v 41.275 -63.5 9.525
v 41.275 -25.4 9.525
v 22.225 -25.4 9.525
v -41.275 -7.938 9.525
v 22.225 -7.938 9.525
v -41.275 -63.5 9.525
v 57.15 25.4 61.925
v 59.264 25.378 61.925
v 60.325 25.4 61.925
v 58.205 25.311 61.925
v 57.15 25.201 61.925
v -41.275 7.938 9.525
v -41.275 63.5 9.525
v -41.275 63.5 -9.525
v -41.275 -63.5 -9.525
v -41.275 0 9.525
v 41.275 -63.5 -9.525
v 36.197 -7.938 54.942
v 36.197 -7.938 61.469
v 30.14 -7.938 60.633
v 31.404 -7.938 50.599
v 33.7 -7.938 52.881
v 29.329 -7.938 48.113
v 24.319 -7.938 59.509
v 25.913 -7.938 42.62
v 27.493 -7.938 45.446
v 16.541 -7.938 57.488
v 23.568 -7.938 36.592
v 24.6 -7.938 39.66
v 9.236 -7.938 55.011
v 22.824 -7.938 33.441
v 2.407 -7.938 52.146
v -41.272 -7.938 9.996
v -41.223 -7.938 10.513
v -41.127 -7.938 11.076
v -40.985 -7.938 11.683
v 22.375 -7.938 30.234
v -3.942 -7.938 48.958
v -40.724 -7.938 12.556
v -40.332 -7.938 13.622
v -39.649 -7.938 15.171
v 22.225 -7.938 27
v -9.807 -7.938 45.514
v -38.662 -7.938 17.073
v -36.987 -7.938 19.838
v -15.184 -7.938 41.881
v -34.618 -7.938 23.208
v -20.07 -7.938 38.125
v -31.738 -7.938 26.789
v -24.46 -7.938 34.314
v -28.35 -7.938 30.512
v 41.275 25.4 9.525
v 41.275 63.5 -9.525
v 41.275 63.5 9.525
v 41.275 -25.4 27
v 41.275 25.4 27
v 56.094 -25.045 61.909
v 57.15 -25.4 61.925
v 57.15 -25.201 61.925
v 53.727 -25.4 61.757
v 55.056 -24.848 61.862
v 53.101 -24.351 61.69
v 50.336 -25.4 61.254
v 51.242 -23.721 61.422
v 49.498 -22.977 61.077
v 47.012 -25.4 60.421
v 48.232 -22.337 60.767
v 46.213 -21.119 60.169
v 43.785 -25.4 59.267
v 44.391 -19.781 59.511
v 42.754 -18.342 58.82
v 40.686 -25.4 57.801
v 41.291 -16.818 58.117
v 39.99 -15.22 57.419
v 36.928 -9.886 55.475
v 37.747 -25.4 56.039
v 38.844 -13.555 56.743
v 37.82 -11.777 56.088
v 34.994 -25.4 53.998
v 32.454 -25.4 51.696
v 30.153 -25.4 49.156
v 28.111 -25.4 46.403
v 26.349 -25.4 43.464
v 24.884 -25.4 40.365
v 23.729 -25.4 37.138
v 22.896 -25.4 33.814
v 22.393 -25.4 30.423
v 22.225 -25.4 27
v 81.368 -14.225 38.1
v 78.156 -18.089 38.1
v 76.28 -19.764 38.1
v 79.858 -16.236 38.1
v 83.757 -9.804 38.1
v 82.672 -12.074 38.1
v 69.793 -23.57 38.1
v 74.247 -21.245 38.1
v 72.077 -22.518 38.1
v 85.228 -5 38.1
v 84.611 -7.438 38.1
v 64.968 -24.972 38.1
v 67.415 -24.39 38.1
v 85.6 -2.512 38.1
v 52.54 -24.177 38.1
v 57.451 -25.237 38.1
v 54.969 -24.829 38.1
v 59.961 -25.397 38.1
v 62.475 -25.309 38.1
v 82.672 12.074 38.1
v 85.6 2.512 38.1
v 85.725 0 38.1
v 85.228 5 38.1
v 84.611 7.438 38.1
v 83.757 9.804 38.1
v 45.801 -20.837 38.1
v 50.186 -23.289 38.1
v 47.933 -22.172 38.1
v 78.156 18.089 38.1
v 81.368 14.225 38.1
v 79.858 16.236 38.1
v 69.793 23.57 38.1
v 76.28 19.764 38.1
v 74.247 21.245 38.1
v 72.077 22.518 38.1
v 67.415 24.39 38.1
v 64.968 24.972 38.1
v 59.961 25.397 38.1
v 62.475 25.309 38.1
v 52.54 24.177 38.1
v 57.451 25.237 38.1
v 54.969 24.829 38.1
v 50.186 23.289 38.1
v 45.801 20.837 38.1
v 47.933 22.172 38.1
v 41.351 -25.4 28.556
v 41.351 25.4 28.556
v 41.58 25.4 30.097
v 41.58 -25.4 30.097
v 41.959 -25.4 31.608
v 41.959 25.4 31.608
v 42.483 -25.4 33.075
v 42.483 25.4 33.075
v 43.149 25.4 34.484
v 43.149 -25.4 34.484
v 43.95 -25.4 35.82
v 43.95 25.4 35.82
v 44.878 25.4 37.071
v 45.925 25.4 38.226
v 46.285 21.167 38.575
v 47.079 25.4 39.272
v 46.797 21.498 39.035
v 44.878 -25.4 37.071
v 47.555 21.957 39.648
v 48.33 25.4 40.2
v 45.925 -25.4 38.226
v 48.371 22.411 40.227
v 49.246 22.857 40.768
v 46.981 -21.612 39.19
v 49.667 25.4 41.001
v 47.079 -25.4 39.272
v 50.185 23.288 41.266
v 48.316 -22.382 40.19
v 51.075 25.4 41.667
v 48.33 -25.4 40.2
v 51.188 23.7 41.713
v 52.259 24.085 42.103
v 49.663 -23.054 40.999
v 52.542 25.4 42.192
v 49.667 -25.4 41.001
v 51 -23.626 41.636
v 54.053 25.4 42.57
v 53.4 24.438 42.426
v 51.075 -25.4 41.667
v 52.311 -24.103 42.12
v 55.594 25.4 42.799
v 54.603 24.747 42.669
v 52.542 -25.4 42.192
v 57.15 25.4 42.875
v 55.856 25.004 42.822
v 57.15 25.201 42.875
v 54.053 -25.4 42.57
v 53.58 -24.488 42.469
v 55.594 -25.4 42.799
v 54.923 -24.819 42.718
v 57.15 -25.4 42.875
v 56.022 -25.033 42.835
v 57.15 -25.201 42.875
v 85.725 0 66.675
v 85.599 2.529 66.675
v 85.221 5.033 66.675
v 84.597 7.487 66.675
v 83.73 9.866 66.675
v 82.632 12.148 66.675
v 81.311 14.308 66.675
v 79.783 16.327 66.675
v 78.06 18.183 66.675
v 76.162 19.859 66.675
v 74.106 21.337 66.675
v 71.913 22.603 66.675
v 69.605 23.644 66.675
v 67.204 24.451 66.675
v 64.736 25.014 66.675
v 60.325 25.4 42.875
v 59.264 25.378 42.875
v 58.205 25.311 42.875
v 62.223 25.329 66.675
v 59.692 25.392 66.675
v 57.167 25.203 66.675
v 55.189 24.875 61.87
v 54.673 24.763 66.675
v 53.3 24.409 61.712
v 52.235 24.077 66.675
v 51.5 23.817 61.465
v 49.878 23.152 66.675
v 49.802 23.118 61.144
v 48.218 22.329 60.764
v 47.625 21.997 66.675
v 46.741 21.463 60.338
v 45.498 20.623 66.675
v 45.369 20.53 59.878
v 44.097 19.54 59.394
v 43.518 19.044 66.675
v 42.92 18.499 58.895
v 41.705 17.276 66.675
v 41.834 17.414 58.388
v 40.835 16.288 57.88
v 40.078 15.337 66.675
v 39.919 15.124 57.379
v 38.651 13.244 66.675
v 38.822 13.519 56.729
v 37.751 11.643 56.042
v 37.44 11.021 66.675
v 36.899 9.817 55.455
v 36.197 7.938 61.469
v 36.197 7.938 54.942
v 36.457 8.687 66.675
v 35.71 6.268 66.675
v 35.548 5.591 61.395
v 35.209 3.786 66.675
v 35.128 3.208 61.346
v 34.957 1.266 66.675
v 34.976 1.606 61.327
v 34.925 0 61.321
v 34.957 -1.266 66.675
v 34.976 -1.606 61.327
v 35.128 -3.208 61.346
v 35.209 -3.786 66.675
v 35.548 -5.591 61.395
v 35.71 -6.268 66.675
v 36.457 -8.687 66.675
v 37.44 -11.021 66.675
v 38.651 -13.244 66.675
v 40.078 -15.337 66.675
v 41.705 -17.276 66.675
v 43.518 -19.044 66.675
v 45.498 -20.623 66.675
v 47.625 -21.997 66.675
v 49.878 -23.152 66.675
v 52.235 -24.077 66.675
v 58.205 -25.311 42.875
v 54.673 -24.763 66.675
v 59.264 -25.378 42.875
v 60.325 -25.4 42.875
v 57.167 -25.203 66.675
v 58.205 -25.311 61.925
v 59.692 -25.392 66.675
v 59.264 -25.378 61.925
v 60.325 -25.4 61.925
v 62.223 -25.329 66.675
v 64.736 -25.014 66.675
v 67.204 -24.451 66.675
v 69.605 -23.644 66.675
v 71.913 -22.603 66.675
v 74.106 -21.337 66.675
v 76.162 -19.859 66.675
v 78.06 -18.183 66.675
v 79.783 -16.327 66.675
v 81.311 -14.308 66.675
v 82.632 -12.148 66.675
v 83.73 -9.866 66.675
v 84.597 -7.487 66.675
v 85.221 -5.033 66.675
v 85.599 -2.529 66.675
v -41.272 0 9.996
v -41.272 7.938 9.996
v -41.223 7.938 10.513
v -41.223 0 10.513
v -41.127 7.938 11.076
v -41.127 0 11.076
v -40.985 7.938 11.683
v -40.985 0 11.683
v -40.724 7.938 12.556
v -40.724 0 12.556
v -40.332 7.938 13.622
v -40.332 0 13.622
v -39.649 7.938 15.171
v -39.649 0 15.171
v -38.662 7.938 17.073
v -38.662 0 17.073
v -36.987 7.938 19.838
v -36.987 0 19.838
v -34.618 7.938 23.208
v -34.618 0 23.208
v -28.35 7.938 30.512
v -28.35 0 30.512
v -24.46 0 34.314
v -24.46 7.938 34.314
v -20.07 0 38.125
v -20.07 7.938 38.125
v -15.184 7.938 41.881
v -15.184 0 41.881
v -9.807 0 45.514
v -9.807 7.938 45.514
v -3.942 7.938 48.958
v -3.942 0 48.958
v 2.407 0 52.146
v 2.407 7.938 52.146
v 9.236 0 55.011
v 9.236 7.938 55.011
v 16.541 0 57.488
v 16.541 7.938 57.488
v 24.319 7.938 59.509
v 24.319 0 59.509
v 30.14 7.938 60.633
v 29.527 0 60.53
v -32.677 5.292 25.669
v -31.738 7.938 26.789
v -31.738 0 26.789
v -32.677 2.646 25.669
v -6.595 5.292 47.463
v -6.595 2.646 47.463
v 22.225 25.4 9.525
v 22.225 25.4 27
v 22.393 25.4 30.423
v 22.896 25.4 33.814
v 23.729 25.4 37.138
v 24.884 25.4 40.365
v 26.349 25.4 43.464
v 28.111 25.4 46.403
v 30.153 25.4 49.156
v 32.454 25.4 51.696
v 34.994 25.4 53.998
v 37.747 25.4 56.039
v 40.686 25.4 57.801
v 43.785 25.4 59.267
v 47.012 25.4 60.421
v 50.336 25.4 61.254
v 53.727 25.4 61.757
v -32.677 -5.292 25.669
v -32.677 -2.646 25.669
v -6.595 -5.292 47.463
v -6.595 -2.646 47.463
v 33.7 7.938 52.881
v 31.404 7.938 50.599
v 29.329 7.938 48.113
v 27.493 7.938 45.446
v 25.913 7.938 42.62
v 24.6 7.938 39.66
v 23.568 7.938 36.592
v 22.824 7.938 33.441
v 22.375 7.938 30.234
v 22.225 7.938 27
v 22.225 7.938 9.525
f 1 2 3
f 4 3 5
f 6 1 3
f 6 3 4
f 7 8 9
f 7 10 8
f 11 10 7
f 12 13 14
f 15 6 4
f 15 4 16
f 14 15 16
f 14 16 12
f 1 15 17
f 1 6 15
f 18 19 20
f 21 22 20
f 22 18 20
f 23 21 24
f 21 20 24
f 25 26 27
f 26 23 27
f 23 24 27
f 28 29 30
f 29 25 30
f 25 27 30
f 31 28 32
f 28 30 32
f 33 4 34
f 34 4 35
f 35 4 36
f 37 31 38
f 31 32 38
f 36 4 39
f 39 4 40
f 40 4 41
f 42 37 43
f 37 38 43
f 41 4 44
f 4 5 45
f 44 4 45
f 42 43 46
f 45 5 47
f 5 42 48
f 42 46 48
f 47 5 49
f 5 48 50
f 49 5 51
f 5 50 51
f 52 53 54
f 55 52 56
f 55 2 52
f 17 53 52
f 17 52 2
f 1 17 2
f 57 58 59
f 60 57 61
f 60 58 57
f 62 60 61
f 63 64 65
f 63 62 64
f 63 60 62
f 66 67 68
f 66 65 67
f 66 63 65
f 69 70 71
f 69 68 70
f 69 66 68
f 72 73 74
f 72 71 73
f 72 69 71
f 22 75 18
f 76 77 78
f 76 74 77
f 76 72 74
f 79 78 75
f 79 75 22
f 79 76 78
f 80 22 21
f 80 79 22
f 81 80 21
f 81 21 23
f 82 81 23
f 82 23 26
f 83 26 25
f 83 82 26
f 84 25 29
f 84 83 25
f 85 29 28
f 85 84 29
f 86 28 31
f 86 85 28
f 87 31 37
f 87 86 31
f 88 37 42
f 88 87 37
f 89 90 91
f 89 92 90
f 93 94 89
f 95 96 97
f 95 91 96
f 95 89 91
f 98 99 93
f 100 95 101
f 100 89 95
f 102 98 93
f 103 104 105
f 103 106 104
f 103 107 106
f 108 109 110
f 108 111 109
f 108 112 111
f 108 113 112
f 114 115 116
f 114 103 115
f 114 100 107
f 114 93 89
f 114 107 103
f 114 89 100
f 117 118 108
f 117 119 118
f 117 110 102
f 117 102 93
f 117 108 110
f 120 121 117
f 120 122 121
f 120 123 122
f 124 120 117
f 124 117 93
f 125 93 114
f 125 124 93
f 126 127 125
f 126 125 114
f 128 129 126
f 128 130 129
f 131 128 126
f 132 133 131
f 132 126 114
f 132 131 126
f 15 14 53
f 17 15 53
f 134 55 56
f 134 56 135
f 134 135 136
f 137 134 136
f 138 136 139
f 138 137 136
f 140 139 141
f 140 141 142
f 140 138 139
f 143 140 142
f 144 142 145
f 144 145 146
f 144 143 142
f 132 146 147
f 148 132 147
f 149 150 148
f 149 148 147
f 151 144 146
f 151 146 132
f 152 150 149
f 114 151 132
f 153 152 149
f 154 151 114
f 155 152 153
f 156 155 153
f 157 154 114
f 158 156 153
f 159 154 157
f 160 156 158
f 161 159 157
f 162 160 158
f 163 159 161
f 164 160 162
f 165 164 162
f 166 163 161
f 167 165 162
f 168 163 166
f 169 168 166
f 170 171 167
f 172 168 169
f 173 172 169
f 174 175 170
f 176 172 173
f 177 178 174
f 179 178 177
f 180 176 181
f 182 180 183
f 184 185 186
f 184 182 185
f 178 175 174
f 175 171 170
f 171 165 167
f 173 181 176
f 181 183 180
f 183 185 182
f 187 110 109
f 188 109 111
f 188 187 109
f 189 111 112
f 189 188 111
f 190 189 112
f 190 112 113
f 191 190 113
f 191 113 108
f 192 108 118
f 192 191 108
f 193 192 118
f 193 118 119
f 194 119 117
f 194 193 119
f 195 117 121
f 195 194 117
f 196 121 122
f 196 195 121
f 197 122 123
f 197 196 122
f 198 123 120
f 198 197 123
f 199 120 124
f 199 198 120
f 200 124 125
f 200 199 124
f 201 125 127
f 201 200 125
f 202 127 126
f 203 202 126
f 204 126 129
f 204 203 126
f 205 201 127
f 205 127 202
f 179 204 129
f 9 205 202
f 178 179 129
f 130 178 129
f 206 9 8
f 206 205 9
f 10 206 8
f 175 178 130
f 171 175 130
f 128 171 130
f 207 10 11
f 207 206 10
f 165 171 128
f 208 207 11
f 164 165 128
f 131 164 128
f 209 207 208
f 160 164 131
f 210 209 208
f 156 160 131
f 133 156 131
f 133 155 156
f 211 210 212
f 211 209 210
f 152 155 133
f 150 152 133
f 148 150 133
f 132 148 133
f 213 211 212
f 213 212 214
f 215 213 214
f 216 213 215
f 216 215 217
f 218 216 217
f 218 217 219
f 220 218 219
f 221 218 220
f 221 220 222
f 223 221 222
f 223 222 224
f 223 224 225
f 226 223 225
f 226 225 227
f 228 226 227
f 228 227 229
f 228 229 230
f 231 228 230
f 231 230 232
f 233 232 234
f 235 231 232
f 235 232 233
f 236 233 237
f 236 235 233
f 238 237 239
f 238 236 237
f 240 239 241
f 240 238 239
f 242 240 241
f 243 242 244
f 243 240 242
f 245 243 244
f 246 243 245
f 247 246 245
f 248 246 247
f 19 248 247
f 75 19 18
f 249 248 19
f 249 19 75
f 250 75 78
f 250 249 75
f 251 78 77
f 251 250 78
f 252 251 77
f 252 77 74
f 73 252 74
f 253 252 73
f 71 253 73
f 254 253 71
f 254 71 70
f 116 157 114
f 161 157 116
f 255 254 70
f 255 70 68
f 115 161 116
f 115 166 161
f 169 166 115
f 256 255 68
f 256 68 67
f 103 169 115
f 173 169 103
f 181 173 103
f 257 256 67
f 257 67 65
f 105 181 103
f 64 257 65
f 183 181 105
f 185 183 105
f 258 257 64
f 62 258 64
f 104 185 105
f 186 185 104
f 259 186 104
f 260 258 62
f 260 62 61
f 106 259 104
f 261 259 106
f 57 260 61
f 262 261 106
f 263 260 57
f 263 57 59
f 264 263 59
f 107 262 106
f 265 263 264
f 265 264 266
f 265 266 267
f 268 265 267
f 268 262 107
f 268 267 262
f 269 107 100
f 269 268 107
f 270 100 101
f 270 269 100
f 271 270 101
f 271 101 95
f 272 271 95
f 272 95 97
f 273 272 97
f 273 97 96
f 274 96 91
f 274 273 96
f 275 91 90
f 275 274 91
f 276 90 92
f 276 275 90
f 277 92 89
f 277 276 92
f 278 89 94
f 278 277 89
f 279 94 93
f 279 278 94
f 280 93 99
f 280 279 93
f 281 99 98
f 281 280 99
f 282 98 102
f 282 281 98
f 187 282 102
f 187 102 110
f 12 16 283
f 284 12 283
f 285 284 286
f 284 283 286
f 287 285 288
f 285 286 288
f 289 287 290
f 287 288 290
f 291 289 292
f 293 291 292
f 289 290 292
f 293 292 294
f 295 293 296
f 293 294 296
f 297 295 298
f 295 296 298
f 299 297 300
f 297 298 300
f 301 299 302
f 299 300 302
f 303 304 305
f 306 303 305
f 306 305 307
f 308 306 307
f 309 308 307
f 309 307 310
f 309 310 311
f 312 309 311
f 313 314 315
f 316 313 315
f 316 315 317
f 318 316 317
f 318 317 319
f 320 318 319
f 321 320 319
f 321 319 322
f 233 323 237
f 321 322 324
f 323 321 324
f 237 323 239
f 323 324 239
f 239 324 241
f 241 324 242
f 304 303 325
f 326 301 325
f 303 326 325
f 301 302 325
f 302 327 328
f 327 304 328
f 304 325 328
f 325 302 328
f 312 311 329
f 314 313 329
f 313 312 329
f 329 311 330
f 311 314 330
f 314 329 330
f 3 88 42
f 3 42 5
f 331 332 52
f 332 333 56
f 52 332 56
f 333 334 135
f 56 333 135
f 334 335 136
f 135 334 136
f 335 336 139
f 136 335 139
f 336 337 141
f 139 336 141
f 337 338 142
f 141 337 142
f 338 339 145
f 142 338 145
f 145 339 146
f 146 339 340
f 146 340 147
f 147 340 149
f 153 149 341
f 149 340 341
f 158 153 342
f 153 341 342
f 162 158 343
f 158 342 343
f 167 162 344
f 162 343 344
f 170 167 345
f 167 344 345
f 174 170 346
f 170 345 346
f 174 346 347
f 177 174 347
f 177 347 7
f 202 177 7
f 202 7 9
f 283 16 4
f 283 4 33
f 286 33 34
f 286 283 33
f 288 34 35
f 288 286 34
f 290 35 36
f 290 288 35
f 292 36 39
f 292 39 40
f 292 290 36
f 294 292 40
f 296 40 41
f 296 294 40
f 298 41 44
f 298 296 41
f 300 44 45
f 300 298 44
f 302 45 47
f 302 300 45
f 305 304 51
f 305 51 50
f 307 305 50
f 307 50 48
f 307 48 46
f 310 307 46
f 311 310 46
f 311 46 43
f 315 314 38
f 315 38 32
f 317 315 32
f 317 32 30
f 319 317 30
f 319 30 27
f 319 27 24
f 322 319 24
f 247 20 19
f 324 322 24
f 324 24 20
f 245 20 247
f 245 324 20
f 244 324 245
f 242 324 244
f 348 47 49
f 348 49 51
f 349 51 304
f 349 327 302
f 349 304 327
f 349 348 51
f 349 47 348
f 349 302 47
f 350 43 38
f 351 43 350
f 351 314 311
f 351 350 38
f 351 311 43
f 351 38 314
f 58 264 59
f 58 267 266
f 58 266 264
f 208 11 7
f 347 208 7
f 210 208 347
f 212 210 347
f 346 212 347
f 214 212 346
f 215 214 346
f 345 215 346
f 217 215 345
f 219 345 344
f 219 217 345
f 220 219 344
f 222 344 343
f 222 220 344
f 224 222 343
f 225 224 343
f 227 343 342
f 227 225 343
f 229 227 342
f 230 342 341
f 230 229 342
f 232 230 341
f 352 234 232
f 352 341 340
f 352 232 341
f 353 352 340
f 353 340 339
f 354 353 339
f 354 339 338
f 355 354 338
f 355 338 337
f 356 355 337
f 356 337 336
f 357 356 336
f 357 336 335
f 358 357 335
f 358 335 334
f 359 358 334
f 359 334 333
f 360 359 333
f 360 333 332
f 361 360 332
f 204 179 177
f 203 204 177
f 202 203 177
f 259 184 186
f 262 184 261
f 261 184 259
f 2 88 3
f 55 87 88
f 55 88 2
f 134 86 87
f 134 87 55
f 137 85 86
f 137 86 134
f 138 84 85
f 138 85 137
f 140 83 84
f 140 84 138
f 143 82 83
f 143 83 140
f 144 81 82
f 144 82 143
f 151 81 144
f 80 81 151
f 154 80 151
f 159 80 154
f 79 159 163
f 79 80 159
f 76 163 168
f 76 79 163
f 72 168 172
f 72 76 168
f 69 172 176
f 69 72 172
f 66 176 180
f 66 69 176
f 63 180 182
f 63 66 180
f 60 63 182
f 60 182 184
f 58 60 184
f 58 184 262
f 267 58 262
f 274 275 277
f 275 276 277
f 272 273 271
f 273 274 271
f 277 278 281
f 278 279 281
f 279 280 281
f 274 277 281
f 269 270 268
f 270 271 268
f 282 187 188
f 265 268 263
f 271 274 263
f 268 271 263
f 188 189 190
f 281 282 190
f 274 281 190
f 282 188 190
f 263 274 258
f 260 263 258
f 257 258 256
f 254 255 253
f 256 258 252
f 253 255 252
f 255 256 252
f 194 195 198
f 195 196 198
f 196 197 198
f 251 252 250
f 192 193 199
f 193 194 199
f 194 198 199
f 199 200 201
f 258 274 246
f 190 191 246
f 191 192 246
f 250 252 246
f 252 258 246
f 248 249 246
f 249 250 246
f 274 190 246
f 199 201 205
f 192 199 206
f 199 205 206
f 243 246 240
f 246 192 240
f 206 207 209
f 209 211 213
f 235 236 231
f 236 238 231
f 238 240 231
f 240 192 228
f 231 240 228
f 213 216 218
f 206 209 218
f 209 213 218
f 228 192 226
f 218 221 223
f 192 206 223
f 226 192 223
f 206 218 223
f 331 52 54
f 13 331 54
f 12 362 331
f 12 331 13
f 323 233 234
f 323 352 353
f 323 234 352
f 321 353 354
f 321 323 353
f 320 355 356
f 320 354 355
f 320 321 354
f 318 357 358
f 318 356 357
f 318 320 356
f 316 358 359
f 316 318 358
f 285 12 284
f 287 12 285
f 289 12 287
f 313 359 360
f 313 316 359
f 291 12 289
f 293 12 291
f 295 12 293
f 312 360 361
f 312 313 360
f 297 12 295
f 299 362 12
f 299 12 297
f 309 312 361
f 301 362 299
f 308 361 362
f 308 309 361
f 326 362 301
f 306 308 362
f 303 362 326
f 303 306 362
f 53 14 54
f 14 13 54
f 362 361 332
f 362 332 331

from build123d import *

# Parameters (mm, degrees)
F1_DEPTH = 63.5
F2_DEPTH = 25.4
F3_DEPTH = 7.9375
F0_W     = 25.4
F0_H     = 4.7498
F0_H_2   = 19.05
F0_H_3   = 4.7752


# Not quite as in the source:
# - a feature names something its author has since deleted; it is built from what else it names


with BuildPart() as f1:
    # F0 (on Front) → F1 (new body, symmetric)
    with BuildSketch(Plane.XZ):
        Polygon((-41.275, -9.525), (41.275, -9.525), (41.275, 9.525), (22.225, 9.525), (-41.275, 9.525), align=None)
    extrude(amount=F1_DEPTH, both=True)

    # F0 (on Front) → F2 (join, symmetric)
    with BuildSketch(Plane.XZ):
        with BuildLine():
            Line((22.225, 9.525), (41.275, 9.525))
            Line((41.275, 9.525), (41.275, 27.0002))
            ThreePointArc((41.275, 27.0002), (45.9246798487, 38.2255201513), (57.15, 42.8752))
            Line((57.15, 42.8752), (60.325, 42.8752))
            Line((60.325, 42.8752), (60.325, 61.9252))
            Line((60.325, 61.9252), (57.15, 61.9252))
            ThreePointArc((57.15, 61.9252), (32.4542956671, 51.6959043329), (22.225, 27.0002))
            Line((22.225, 27.0002), (22.225, 9.525))
        make_face()
    extrude(amount=F2_DEPTH, both=True)

    # F0 (on Front) → F3 (join, symmetric)
    with BuildSketch(Plane.XZ):
        with BuildLine():
            add(Edge.make_bspline(
                [(-41.275, 9.525), (-41.7312111626, 19.5100846971), (-7.2445928525, 66.0155981062), (57.15, 61.9252)],
                knots=[0, 0, 0, 0, 111.5045361635, 111.5045361635, 111.5045361635, 111.5045361635], degree=3))
            Line((-41.275, 9.525), (22.225, 9.525))
            Line((22.225, 9.525), (22.225, 27.0002))
            ThreePointArc((22.225, 27.0002), (32.4542956671, 51.6959043329), (57.15, 61.9252))
        make_face()
    extrude(amount=F3_DEPTH, both=True)

    # F0 (on Front) → F4 (revolve)
    with BuildSketch(Plane.XZ):
        with Locations((73.025, 64.3001)):
            Rectangle(F0_W, F0_H)
        with Locations((73.025, 52.4002)):
            Rectangle(F0_W, F0_H_2)
        with Locations((73.025, 40.4876)):
            Rectangle(F0_W, F0_H_3)
    revolve(axis=Axis((60.325, 0, 52.3875), (0, 0, 1)))


solid = f1.part
